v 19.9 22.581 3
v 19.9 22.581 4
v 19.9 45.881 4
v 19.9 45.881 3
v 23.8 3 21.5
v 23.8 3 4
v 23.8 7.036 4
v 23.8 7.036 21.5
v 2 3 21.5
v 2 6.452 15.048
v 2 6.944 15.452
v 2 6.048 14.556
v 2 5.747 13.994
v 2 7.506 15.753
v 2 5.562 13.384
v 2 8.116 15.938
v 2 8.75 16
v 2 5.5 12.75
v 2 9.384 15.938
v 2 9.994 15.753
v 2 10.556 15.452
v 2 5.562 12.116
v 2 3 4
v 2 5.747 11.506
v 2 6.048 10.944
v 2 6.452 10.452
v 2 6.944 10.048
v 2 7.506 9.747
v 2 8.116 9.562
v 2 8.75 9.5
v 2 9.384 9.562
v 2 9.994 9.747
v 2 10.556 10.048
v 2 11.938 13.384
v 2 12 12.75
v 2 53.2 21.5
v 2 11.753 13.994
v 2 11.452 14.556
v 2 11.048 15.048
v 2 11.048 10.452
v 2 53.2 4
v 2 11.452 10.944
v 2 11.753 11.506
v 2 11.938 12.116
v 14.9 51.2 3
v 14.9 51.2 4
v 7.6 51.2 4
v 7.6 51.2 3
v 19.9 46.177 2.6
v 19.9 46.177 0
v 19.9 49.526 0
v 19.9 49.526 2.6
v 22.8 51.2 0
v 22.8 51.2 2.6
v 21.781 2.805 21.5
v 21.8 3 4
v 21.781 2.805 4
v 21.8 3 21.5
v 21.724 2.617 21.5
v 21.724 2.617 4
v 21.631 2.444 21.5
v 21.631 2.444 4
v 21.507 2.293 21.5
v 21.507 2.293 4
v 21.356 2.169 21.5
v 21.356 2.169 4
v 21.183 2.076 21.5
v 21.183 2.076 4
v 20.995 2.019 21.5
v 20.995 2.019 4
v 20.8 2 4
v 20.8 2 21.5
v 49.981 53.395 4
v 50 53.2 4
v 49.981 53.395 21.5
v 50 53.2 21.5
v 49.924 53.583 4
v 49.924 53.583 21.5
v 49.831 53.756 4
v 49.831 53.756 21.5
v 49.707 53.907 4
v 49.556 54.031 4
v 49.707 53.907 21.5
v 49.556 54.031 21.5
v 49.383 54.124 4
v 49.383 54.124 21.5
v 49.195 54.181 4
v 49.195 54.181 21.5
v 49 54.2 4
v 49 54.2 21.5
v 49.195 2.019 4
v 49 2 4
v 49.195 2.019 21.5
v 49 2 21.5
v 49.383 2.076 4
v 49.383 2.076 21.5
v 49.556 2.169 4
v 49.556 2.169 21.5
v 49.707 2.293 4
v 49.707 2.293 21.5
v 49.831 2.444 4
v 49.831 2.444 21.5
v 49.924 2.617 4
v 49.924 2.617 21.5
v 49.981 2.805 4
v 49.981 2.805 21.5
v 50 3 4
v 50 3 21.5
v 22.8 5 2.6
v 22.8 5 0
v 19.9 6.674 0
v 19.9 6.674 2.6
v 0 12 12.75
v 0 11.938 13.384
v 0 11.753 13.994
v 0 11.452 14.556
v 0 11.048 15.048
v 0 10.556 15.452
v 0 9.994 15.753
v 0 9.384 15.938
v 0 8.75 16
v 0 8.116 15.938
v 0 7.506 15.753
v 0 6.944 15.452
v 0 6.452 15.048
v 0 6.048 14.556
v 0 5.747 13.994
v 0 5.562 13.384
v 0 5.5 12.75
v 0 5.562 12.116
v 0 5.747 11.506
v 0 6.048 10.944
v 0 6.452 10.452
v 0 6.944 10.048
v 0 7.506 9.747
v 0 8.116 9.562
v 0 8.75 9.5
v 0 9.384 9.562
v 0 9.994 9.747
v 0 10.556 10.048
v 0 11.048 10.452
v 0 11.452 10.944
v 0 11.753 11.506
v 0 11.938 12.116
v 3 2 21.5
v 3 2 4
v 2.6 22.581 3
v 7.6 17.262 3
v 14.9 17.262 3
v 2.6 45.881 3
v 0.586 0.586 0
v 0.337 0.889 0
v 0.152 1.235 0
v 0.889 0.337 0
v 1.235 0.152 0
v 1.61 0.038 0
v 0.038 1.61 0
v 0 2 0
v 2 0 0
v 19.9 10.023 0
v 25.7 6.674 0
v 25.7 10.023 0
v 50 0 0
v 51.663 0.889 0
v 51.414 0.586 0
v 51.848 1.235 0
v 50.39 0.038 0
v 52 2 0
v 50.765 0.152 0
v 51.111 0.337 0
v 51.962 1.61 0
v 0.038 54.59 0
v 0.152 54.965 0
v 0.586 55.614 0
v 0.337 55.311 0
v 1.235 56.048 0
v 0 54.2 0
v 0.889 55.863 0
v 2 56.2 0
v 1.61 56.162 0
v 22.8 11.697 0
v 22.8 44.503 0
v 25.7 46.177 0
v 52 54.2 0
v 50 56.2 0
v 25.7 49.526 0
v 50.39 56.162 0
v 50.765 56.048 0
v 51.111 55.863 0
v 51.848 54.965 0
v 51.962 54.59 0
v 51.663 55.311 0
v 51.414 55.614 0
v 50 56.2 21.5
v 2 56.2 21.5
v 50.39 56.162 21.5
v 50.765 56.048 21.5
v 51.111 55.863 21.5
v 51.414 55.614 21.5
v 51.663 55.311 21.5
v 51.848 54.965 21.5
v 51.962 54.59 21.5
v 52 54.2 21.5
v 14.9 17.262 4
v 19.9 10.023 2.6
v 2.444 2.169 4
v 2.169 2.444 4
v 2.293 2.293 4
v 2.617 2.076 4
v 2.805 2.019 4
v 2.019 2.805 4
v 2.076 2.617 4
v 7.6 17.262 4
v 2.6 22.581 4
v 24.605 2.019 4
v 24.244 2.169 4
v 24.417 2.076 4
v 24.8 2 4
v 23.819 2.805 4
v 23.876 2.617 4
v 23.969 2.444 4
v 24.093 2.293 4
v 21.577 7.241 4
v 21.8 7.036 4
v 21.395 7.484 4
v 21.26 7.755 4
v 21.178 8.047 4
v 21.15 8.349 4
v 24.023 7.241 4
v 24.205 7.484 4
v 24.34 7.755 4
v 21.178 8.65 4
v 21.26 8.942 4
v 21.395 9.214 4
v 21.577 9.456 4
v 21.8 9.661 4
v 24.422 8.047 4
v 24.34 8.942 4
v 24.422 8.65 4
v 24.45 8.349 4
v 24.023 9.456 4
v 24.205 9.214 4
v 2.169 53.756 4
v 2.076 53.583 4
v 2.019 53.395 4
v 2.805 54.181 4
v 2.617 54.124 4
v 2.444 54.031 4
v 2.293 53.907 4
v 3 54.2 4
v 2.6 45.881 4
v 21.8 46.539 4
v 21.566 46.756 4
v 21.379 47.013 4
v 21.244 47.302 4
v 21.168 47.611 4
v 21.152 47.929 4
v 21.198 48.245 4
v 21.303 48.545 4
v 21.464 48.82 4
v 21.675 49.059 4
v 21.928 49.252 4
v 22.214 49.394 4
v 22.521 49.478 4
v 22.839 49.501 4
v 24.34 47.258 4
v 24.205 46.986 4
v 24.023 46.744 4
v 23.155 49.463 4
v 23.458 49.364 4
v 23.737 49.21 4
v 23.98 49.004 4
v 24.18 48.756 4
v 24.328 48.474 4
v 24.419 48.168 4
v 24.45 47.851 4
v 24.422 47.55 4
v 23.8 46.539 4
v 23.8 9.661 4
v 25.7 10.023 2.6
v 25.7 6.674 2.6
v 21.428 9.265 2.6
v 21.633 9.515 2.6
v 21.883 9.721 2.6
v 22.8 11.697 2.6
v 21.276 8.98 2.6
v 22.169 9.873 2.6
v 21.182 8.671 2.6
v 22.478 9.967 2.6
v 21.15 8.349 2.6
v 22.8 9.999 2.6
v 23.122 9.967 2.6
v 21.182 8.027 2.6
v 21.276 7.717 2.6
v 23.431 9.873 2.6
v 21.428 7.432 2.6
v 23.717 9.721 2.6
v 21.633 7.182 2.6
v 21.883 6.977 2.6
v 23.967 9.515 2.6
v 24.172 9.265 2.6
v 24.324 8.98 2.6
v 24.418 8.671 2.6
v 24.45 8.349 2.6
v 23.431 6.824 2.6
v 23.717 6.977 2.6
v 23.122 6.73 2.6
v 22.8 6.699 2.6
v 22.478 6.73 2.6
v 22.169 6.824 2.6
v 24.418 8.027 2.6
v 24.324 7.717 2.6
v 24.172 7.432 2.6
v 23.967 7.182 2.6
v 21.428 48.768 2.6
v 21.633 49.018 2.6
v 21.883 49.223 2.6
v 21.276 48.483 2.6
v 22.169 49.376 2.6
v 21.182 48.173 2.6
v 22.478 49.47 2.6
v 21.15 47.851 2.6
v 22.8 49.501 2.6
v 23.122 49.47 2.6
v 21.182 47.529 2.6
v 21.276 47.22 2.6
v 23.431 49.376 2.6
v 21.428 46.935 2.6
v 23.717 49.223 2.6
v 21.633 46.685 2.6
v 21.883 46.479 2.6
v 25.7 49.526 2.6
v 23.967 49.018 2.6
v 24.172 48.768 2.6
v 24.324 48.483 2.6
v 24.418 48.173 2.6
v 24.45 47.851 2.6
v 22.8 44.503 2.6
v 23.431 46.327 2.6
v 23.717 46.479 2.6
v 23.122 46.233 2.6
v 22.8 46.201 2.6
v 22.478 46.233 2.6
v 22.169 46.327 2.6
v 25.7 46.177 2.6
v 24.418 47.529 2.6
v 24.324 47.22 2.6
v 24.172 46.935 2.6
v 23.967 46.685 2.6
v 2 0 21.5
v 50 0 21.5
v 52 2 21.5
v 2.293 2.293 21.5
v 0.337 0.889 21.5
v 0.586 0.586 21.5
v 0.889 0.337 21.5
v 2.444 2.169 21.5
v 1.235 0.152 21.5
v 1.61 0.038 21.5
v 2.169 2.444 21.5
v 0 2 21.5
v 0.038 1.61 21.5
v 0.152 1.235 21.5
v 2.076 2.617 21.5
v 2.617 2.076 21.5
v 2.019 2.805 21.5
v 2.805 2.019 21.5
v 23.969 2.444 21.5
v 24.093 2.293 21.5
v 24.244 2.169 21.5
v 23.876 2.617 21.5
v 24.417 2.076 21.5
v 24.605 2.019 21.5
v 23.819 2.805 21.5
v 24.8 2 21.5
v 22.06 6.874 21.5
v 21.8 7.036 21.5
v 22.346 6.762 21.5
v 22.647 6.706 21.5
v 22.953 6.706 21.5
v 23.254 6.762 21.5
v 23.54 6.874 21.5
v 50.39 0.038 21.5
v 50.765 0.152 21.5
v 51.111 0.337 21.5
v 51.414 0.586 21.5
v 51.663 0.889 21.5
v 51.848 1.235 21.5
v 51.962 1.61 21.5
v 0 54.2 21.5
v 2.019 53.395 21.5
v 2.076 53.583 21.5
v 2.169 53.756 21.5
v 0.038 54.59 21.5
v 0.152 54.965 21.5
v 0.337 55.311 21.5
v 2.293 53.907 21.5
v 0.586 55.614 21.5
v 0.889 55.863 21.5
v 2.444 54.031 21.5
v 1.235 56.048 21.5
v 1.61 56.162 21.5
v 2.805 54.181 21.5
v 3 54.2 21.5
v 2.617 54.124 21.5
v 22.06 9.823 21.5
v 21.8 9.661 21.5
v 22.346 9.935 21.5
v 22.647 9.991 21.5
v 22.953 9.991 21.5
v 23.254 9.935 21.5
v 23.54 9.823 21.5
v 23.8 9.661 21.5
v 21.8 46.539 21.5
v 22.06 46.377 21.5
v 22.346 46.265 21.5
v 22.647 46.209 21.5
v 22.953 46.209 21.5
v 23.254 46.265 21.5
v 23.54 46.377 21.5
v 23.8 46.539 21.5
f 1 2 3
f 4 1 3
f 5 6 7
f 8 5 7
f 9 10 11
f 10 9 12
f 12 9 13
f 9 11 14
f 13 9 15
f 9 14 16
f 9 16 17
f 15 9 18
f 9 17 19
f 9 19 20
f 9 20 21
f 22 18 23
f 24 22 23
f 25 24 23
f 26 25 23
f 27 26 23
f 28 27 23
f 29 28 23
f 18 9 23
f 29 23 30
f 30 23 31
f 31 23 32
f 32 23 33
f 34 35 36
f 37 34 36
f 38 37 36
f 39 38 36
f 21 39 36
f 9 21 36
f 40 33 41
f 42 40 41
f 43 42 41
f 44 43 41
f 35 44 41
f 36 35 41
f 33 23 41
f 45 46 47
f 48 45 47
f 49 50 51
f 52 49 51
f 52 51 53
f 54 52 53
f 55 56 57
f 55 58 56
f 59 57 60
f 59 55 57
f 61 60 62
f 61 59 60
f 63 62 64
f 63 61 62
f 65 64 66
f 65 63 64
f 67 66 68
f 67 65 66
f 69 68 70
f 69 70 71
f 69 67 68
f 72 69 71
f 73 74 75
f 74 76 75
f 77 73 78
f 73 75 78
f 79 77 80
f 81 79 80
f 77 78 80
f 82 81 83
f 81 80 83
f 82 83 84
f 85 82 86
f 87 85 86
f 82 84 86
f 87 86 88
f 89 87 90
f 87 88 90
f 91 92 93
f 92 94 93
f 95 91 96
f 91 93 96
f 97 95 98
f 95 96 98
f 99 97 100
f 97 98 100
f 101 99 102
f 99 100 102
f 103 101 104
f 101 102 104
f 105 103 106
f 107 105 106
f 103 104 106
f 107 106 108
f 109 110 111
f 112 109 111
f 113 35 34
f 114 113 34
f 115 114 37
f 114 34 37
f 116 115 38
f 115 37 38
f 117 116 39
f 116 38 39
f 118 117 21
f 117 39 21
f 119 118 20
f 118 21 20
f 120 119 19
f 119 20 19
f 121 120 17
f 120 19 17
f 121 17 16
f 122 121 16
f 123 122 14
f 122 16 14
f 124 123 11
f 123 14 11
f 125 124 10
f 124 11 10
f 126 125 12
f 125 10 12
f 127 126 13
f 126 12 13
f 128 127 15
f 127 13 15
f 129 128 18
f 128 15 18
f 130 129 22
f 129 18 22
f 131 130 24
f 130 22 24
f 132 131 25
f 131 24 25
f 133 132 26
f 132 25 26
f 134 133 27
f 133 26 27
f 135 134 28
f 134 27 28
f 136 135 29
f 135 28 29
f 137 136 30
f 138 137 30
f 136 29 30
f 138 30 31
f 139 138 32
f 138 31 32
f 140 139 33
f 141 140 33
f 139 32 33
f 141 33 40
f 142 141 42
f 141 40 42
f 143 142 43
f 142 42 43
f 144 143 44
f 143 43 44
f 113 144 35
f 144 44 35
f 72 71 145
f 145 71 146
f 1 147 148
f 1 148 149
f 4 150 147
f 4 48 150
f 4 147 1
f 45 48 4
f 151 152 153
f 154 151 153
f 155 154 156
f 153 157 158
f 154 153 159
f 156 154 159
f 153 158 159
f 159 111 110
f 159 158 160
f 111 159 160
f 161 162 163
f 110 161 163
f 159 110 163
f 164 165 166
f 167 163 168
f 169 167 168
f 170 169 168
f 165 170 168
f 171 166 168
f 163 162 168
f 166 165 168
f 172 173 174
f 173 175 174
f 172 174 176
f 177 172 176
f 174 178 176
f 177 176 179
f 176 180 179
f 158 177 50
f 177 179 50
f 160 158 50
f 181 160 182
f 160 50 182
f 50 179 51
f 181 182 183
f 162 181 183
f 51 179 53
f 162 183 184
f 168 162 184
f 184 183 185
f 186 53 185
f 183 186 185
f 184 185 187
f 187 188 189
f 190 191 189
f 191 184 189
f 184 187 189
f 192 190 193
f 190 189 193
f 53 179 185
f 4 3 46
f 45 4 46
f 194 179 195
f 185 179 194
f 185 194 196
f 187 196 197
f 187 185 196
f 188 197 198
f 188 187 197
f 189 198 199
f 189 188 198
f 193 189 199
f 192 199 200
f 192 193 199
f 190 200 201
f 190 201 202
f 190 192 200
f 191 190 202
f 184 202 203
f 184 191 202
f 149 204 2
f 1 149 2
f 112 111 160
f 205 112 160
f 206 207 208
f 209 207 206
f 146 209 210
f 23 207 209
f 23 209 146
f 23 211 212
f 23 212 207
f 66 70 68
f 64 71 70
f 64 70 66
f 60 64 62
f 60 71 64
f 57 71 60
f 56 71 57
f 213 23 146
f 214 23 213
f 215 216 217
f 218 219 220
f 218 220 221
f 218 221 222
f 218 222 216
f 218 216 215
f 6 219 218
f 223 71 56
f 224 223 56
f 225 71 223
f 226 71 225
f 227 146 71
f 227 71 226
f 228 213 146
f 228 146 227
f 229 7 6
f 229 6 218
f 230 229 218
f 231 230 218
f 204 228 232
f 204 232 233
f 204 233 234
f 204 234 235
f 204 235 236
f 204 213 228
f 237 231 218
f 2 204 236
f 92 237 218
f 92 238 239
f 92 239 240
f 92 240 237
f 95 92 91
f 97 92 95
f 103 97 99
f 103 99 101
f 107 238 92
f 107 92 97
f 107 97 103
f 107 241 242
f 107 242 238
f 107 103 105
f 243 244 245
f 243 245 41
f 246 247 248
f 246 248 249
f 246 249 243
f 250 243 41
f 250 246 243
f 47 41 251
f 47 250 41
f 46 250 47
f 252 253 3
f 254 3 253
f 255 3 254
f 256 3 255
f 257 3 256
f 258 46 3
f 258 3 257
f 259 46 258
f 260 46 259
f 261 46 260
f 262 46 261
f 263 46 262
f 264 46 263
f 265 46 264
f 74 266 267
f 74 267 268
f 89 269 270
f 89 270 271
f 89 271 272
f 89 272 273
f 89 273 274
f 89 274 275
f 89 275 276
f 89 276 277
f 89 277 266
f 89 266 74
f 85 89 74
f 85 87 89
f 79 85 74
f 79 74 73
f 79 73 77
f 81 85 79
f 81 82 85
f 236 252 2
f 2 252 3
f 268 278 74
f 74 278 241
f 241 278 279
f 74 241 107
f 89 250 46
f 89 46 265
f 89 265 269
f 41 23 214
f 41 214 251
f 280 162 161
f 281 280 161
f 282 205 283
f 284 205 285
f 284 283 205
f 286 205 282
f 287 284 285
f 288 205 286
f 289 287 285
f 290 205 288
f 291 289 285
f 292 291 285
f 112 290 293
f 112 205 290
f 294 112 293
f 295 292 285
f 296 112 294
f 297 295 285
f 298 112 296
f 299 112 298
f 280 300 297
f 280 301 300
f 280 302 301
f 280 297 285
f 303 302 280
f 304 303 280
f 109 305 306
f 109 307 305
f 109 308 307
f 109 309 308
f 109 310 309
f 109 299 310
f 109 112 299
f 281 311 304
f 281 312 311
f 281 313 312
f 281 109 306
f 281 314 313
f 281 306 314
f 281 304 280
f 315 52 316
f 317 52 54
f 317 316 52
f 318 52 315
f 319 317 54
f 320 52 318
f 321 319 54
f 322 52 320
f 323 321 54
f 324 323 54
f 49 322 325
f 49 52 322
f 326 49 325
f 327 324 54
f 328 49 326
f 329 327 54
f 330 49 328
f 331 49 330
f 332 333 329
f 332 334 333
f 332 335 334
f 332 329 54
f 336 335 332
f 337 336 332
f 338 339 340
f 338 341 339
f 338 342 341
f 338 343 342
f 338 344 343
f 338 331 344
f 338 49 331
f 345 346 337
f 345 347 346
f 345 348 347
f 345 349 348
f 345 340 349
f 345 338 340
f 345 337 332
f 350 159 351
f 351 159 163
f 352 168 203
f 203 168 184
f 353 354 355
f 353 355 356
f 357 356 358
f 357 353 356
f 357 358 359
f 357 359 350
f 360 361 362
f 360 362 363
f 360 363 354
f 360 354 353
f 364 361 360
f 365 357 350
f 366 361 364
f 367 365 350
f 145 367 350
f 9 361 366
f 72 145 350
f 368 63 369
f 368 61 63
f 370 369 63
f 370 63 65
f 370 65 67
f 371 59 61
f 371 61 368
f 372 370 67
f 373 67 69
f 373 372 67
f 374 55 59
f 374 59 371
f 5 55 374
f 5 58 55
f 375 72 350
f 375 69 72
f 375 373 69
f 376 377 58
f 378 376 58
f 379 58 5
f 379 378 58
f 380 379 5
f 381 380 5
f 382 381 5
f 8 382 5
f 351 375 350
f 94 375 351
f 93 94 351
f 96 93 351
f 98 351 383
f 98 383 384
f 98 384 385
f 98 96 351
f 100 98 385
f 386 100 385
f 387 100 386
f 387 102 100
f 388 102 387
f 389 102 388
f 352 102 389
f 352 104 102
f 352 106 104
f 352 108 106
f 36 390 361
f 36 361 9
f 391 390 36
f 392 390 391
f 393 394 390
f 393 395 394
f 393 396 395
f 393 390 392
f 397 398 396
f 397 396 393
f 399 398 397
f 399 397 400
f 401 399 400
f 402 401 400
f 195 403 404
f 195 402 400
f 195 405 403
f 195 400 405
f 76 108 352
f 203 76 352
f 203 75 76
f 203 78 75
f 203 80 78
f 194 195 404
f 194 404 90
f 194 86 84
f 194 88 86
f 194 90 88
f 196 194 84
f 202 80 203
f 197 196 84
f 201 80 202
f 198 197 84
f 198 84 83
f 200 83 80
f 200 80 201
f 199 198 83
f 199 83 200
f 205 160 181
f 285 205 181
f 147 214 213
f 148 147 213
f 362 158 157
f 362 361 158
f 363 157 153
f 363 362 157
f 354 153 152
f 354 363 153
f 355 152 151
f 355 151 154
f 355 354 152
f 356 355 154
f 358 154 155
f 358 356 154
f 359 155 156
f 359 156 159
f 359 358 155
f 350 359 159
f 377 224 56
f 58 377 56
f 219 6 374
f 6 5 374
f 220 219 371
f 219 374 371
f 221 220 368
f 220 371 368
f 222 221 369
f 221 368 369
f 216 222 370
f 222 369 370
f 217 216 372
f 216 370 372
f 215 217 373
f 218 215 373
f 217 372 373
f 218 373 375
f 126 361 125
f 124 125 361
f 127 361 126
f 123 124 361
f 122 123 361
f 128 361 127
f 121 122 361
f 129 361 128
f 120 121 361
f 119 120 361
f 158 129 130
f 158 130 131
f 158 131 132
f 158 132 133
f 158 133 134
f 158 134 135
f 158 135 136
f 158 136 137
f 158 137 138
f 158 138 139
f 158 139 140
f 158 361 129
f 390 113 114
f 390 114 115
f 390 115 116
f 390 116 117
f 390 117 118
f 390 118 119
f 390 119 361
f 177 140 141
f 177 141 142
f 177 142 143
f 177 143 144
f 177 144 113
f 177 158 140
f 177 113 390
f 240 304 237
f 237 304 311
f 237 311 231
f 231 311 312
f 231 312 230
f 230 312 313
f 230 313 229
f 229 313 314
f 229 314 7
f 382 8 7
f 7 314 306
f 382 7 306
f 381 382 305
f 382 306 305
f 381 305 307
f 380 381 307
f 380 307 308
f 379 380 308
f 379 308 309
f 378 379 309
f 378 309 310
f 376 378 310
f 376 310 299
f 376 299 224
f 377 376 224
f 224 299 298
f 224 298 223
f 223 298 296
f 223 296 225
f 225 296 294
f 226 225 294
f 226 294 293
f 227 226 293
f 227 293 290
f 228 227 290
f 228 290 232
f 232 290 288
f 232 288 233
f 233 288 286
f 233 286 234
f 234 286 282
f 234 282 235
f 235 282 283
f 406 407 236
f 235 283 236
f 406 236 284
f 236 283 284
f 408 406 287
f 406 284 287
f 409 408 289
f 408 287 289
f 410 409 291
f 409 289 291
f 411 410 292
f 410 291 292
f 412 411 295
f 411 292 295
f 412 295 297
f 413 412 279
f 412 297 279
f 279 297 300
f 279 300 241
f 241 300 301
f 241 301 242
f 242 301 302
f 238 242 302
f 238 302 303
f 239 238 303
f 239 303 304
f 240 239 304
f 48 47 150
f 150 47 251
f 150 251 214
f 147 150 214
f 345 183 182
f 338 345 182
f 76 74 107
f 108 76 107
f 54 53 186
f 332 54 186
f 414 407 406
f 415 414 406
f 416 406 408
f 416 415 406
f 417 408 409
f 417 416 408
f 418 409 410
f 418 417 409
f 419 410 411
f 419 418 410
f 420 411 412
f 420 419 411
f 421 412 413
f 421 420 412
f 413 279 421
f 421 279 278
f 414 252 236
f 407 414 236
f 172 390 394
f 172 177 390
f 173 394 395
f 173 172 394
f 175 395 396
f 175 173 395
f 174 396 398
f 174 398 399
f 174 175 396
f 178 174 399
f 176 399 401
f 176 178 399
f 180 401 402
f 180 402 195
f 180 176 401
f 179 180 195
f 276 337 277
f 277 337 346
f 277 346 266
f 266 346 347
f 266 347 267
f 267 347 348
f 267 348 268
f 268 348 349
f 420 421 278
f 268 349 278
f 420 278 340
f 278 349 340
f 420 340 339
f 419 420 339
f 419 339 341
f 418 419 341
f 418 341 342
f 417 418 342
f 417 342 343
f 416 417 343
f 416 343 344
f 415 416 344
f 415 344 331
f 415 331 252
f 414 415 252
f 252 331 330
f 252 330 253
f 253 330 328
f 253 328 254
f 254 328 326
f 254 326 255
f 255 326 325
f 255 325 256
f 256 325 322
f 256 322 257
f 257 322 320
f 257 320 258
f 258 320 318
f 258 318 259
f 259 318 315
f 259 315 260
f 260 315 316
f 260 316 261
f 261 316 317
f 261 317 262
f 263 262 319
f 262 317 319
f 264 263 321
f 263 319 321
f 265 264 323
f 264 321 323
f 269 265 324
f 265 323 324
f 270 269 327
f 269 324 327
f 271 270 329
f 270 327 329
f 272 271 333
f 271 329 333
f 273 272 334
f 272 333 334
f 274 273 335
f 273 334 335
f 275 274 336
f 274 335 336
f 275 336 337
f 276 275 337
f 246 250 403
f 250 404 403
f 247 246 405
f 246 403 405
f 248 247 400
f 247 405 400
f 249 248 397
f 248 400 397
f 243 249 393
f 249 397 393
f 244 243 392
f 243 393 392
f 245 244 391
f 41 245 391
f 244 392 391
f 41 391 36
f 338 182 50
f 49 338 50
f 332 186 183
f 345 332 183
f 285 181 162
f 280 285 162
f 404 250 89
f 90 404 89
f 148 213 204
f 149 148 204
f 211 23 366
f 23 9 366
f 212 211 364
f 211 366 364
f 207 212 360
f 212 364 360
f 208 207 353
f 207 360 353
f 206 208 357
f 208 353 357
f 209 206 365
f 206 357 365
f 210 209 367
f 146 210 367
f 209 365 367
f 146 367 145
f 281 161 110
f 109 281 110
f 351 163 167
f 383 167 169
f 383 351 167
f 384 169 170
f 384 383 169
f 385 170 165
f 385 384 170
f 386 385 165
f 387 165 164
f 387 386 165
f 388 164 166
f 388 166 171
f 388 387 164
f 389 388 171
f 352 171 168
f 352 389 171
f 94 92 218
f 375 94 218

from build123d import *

# Parameters (mm, degrees)
F0_W      = 52
F0_H      = 56.2
F1_DEPTH  = 4
F2_W      = 52
F2_H      = 56.2
F3_DEPTH  = 17.5
F5_DEPTH  = 1
F6_R      = 3.25
F7_DEPTH  = 2
F9_DEPTH  = 2.6
F10_R     = 1.65
F11_DEPTH = 21.501
F12_R     = 2
F13_R     = 1


with BuildPart() as f1:
    # F0 (on Top) → F1 (new body)
    with BuildSketch(Plane.XY):
        with Locations((26, 28.1)):
            Rectangle(F0_W, F0_H)
    extrude(amount=F1_DEPTH)

    # F2 (on face) → F3 (join)
    with BuildSketch(Plane.XY.offset(4)):
        with Locations((26, 28.1)):
            Rectangle(F2_W, F2_H)
        Polygon((2, 2), (2, 54.2), (50, 54.2), (50, 2), (23.8, 2), (23.8, 48.2), (21.8, 48.2), (21.8, 2), align=None, mode=Mode.SUBTRACT)
    extrude(amount=F3_DEPTH)

    # F4 (on face) → F5 (cut)
    with BuildSketch(Plane.XY.offset(4)):
        Polygon((2.6, 45.881166), (2.6, 22.581166), (7.6, 17.262331), (14.9, 17.262331), (19.9, 22.581166), (19.9, 45.881166), (14.9, 51.2), (7.6, 51.2), align=None)
    extrude(amount=-F5_DEPTH, mode=Mode.SUBTRACT)

    # F6 (on face) → F7 (cut, through all)
    with BuildSketch(Plane.YZ.offset(2)):
        with Locations((8.75, 12.75)):
            Circle(F6_R)
    extrude(amount=-F7_DEPTH, mode=Mode.SUBTRACT)

    # F8 (on face) → F9 (cut)
    with BuildSketch(Plane(origin=(0, 0, 0), x_dir=(1, 0, 0), z_dir=(0, 0, -1))):
        Polygon((19.9, -10.022947), (22.8, -11.697263), (25.7, -10.022947), (25.7, -6.674316), (22.8, -5), (19.9, -6.674316), align=None)
        Polygon((22.8, -44.502737), (19.9, -46.177053), (19.9, -49.525684), (22.8, -51.2), (25.7, -49.525684), (25.7, -46.177053), align=None)
    extrude(amount=-F9_DEPTH, mode=Mode.SUBTRACT)

    # F10 (on face) → F11 (cut, through all)
    with BuildSketch(Plane(origin=(0, 0, 0), x_dir=(1, 0, 0), z_dir=(0, 0, -1))):
        with Locations((22.8, -47.851368)):
            Circle(F10_R)
        with Locations((22.8, -8.348632)):
            Circle(F10_R)
    extrude(amount=-F11_DEPTH, mode=Mode.SUBTRACT)

    # F12
    f12_edges = [f1.edges().sort_by_distance(p)[0] for p in [
        (0, 0, 10.75),
        (52, 0, 10.75),
        (0, 56.2, 10.75),
        (52, 56.2, 10.75),
    ]]
    fillet(f12_edges, radius=F12_R)

    # F13
    f13_edges = [f1.edges().sort_by_distance(p)[0] for p in [
        (50, 54.2, 12.75),
        (50, 2, 12.75),
        (2, 2, 12.75),
        (2, 54.2, 12.75),
        (21.8, 2, 12.75),
        (23.8, 2, 12.75),
    ]]
    fillet(f13_edges, radius=F13_R)


solid = f1.part
